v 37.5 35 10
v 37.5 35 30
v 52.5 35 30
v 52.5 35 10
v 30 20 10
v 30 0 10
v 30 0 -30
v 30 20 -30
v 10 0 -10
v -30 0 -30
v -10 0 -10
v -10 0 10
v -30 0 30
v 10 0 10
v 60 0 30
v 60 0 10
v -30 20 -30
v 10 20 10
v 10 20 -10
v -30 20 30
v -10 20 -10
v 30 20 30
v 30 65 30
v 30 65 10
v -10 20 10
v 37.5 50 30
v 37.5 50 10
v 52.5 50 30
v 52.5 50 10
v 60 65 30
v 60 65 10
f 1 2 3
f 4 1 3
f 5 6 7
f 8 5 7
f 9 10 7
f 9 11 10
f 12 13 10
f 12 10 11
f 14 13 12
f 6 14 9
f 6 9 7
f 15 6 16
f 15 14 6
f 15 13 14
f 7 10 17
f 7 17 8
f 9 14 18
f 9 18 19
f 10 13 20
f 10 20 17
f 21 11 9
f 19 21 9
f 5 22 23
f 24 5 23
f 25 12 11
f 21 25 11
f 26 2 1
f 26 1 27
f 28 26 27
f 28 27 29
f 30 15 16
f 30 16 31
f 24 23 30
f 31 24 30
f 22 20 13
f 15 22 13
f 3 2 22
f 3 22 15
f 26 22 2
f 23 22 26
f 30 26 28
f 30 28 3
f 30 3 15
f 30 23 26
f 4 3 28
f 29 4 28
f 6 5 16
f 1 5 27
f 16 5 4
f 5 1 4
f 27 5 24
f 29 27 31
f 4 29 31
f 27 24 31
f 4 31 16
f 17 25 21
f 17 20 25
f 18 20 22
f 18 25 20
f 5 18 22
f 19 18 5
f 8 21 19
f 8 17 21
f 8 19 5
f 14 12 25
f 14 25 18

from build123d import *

# Parameters (mm, degrees)
SKETCH1_W           = 60
SKETCH1_H           = 60
SKETCH1_W_2         = 20
SKETCH1_H_2         = 20
BOSS_EXTRUDE1_DEPTH = 20
SKETCH2_W           = 30
SKETCH2_H           = 65
SKETCH2_W_2         = 15
SKETCH2_H_2         = 15
BOSS_EXTRUDE2_DEPTH = 20


with BuildPart() as part:
    # Sketch1 → Boss-Extrude1 (new body)
    with BuildSketch(Plane(origin=(0, 0, 0), x_dir=(1, 0, 0), z_dir=(0, 1, 0))):
        Rectangle(SKETCH1_W, SKETCH1_H)
        Rectangle(SKETCH1_W_2, SKETCH1_H_2, mode=Mode.SUBTRACT)
    extrude(amount=BOSS_EXTRUDE1_DEPTH)

    # Sketch2 → Boss-Extrude2 (add)
    with BuildSketch(Plane.XY.offset(30)):
        with Locations((45, 32.5)):
            Rectangle(SKETCH2_W, SKETCH2_H)
        with Locations((45, 42.5)):
            Rectangle(SKETCH2_W_2, SKETCH2_H_2, mode=Mode.SUBTRACT)
    extrude(amount=-BOSS_EXTRUDE2_DEPTH)


solid = part.part
